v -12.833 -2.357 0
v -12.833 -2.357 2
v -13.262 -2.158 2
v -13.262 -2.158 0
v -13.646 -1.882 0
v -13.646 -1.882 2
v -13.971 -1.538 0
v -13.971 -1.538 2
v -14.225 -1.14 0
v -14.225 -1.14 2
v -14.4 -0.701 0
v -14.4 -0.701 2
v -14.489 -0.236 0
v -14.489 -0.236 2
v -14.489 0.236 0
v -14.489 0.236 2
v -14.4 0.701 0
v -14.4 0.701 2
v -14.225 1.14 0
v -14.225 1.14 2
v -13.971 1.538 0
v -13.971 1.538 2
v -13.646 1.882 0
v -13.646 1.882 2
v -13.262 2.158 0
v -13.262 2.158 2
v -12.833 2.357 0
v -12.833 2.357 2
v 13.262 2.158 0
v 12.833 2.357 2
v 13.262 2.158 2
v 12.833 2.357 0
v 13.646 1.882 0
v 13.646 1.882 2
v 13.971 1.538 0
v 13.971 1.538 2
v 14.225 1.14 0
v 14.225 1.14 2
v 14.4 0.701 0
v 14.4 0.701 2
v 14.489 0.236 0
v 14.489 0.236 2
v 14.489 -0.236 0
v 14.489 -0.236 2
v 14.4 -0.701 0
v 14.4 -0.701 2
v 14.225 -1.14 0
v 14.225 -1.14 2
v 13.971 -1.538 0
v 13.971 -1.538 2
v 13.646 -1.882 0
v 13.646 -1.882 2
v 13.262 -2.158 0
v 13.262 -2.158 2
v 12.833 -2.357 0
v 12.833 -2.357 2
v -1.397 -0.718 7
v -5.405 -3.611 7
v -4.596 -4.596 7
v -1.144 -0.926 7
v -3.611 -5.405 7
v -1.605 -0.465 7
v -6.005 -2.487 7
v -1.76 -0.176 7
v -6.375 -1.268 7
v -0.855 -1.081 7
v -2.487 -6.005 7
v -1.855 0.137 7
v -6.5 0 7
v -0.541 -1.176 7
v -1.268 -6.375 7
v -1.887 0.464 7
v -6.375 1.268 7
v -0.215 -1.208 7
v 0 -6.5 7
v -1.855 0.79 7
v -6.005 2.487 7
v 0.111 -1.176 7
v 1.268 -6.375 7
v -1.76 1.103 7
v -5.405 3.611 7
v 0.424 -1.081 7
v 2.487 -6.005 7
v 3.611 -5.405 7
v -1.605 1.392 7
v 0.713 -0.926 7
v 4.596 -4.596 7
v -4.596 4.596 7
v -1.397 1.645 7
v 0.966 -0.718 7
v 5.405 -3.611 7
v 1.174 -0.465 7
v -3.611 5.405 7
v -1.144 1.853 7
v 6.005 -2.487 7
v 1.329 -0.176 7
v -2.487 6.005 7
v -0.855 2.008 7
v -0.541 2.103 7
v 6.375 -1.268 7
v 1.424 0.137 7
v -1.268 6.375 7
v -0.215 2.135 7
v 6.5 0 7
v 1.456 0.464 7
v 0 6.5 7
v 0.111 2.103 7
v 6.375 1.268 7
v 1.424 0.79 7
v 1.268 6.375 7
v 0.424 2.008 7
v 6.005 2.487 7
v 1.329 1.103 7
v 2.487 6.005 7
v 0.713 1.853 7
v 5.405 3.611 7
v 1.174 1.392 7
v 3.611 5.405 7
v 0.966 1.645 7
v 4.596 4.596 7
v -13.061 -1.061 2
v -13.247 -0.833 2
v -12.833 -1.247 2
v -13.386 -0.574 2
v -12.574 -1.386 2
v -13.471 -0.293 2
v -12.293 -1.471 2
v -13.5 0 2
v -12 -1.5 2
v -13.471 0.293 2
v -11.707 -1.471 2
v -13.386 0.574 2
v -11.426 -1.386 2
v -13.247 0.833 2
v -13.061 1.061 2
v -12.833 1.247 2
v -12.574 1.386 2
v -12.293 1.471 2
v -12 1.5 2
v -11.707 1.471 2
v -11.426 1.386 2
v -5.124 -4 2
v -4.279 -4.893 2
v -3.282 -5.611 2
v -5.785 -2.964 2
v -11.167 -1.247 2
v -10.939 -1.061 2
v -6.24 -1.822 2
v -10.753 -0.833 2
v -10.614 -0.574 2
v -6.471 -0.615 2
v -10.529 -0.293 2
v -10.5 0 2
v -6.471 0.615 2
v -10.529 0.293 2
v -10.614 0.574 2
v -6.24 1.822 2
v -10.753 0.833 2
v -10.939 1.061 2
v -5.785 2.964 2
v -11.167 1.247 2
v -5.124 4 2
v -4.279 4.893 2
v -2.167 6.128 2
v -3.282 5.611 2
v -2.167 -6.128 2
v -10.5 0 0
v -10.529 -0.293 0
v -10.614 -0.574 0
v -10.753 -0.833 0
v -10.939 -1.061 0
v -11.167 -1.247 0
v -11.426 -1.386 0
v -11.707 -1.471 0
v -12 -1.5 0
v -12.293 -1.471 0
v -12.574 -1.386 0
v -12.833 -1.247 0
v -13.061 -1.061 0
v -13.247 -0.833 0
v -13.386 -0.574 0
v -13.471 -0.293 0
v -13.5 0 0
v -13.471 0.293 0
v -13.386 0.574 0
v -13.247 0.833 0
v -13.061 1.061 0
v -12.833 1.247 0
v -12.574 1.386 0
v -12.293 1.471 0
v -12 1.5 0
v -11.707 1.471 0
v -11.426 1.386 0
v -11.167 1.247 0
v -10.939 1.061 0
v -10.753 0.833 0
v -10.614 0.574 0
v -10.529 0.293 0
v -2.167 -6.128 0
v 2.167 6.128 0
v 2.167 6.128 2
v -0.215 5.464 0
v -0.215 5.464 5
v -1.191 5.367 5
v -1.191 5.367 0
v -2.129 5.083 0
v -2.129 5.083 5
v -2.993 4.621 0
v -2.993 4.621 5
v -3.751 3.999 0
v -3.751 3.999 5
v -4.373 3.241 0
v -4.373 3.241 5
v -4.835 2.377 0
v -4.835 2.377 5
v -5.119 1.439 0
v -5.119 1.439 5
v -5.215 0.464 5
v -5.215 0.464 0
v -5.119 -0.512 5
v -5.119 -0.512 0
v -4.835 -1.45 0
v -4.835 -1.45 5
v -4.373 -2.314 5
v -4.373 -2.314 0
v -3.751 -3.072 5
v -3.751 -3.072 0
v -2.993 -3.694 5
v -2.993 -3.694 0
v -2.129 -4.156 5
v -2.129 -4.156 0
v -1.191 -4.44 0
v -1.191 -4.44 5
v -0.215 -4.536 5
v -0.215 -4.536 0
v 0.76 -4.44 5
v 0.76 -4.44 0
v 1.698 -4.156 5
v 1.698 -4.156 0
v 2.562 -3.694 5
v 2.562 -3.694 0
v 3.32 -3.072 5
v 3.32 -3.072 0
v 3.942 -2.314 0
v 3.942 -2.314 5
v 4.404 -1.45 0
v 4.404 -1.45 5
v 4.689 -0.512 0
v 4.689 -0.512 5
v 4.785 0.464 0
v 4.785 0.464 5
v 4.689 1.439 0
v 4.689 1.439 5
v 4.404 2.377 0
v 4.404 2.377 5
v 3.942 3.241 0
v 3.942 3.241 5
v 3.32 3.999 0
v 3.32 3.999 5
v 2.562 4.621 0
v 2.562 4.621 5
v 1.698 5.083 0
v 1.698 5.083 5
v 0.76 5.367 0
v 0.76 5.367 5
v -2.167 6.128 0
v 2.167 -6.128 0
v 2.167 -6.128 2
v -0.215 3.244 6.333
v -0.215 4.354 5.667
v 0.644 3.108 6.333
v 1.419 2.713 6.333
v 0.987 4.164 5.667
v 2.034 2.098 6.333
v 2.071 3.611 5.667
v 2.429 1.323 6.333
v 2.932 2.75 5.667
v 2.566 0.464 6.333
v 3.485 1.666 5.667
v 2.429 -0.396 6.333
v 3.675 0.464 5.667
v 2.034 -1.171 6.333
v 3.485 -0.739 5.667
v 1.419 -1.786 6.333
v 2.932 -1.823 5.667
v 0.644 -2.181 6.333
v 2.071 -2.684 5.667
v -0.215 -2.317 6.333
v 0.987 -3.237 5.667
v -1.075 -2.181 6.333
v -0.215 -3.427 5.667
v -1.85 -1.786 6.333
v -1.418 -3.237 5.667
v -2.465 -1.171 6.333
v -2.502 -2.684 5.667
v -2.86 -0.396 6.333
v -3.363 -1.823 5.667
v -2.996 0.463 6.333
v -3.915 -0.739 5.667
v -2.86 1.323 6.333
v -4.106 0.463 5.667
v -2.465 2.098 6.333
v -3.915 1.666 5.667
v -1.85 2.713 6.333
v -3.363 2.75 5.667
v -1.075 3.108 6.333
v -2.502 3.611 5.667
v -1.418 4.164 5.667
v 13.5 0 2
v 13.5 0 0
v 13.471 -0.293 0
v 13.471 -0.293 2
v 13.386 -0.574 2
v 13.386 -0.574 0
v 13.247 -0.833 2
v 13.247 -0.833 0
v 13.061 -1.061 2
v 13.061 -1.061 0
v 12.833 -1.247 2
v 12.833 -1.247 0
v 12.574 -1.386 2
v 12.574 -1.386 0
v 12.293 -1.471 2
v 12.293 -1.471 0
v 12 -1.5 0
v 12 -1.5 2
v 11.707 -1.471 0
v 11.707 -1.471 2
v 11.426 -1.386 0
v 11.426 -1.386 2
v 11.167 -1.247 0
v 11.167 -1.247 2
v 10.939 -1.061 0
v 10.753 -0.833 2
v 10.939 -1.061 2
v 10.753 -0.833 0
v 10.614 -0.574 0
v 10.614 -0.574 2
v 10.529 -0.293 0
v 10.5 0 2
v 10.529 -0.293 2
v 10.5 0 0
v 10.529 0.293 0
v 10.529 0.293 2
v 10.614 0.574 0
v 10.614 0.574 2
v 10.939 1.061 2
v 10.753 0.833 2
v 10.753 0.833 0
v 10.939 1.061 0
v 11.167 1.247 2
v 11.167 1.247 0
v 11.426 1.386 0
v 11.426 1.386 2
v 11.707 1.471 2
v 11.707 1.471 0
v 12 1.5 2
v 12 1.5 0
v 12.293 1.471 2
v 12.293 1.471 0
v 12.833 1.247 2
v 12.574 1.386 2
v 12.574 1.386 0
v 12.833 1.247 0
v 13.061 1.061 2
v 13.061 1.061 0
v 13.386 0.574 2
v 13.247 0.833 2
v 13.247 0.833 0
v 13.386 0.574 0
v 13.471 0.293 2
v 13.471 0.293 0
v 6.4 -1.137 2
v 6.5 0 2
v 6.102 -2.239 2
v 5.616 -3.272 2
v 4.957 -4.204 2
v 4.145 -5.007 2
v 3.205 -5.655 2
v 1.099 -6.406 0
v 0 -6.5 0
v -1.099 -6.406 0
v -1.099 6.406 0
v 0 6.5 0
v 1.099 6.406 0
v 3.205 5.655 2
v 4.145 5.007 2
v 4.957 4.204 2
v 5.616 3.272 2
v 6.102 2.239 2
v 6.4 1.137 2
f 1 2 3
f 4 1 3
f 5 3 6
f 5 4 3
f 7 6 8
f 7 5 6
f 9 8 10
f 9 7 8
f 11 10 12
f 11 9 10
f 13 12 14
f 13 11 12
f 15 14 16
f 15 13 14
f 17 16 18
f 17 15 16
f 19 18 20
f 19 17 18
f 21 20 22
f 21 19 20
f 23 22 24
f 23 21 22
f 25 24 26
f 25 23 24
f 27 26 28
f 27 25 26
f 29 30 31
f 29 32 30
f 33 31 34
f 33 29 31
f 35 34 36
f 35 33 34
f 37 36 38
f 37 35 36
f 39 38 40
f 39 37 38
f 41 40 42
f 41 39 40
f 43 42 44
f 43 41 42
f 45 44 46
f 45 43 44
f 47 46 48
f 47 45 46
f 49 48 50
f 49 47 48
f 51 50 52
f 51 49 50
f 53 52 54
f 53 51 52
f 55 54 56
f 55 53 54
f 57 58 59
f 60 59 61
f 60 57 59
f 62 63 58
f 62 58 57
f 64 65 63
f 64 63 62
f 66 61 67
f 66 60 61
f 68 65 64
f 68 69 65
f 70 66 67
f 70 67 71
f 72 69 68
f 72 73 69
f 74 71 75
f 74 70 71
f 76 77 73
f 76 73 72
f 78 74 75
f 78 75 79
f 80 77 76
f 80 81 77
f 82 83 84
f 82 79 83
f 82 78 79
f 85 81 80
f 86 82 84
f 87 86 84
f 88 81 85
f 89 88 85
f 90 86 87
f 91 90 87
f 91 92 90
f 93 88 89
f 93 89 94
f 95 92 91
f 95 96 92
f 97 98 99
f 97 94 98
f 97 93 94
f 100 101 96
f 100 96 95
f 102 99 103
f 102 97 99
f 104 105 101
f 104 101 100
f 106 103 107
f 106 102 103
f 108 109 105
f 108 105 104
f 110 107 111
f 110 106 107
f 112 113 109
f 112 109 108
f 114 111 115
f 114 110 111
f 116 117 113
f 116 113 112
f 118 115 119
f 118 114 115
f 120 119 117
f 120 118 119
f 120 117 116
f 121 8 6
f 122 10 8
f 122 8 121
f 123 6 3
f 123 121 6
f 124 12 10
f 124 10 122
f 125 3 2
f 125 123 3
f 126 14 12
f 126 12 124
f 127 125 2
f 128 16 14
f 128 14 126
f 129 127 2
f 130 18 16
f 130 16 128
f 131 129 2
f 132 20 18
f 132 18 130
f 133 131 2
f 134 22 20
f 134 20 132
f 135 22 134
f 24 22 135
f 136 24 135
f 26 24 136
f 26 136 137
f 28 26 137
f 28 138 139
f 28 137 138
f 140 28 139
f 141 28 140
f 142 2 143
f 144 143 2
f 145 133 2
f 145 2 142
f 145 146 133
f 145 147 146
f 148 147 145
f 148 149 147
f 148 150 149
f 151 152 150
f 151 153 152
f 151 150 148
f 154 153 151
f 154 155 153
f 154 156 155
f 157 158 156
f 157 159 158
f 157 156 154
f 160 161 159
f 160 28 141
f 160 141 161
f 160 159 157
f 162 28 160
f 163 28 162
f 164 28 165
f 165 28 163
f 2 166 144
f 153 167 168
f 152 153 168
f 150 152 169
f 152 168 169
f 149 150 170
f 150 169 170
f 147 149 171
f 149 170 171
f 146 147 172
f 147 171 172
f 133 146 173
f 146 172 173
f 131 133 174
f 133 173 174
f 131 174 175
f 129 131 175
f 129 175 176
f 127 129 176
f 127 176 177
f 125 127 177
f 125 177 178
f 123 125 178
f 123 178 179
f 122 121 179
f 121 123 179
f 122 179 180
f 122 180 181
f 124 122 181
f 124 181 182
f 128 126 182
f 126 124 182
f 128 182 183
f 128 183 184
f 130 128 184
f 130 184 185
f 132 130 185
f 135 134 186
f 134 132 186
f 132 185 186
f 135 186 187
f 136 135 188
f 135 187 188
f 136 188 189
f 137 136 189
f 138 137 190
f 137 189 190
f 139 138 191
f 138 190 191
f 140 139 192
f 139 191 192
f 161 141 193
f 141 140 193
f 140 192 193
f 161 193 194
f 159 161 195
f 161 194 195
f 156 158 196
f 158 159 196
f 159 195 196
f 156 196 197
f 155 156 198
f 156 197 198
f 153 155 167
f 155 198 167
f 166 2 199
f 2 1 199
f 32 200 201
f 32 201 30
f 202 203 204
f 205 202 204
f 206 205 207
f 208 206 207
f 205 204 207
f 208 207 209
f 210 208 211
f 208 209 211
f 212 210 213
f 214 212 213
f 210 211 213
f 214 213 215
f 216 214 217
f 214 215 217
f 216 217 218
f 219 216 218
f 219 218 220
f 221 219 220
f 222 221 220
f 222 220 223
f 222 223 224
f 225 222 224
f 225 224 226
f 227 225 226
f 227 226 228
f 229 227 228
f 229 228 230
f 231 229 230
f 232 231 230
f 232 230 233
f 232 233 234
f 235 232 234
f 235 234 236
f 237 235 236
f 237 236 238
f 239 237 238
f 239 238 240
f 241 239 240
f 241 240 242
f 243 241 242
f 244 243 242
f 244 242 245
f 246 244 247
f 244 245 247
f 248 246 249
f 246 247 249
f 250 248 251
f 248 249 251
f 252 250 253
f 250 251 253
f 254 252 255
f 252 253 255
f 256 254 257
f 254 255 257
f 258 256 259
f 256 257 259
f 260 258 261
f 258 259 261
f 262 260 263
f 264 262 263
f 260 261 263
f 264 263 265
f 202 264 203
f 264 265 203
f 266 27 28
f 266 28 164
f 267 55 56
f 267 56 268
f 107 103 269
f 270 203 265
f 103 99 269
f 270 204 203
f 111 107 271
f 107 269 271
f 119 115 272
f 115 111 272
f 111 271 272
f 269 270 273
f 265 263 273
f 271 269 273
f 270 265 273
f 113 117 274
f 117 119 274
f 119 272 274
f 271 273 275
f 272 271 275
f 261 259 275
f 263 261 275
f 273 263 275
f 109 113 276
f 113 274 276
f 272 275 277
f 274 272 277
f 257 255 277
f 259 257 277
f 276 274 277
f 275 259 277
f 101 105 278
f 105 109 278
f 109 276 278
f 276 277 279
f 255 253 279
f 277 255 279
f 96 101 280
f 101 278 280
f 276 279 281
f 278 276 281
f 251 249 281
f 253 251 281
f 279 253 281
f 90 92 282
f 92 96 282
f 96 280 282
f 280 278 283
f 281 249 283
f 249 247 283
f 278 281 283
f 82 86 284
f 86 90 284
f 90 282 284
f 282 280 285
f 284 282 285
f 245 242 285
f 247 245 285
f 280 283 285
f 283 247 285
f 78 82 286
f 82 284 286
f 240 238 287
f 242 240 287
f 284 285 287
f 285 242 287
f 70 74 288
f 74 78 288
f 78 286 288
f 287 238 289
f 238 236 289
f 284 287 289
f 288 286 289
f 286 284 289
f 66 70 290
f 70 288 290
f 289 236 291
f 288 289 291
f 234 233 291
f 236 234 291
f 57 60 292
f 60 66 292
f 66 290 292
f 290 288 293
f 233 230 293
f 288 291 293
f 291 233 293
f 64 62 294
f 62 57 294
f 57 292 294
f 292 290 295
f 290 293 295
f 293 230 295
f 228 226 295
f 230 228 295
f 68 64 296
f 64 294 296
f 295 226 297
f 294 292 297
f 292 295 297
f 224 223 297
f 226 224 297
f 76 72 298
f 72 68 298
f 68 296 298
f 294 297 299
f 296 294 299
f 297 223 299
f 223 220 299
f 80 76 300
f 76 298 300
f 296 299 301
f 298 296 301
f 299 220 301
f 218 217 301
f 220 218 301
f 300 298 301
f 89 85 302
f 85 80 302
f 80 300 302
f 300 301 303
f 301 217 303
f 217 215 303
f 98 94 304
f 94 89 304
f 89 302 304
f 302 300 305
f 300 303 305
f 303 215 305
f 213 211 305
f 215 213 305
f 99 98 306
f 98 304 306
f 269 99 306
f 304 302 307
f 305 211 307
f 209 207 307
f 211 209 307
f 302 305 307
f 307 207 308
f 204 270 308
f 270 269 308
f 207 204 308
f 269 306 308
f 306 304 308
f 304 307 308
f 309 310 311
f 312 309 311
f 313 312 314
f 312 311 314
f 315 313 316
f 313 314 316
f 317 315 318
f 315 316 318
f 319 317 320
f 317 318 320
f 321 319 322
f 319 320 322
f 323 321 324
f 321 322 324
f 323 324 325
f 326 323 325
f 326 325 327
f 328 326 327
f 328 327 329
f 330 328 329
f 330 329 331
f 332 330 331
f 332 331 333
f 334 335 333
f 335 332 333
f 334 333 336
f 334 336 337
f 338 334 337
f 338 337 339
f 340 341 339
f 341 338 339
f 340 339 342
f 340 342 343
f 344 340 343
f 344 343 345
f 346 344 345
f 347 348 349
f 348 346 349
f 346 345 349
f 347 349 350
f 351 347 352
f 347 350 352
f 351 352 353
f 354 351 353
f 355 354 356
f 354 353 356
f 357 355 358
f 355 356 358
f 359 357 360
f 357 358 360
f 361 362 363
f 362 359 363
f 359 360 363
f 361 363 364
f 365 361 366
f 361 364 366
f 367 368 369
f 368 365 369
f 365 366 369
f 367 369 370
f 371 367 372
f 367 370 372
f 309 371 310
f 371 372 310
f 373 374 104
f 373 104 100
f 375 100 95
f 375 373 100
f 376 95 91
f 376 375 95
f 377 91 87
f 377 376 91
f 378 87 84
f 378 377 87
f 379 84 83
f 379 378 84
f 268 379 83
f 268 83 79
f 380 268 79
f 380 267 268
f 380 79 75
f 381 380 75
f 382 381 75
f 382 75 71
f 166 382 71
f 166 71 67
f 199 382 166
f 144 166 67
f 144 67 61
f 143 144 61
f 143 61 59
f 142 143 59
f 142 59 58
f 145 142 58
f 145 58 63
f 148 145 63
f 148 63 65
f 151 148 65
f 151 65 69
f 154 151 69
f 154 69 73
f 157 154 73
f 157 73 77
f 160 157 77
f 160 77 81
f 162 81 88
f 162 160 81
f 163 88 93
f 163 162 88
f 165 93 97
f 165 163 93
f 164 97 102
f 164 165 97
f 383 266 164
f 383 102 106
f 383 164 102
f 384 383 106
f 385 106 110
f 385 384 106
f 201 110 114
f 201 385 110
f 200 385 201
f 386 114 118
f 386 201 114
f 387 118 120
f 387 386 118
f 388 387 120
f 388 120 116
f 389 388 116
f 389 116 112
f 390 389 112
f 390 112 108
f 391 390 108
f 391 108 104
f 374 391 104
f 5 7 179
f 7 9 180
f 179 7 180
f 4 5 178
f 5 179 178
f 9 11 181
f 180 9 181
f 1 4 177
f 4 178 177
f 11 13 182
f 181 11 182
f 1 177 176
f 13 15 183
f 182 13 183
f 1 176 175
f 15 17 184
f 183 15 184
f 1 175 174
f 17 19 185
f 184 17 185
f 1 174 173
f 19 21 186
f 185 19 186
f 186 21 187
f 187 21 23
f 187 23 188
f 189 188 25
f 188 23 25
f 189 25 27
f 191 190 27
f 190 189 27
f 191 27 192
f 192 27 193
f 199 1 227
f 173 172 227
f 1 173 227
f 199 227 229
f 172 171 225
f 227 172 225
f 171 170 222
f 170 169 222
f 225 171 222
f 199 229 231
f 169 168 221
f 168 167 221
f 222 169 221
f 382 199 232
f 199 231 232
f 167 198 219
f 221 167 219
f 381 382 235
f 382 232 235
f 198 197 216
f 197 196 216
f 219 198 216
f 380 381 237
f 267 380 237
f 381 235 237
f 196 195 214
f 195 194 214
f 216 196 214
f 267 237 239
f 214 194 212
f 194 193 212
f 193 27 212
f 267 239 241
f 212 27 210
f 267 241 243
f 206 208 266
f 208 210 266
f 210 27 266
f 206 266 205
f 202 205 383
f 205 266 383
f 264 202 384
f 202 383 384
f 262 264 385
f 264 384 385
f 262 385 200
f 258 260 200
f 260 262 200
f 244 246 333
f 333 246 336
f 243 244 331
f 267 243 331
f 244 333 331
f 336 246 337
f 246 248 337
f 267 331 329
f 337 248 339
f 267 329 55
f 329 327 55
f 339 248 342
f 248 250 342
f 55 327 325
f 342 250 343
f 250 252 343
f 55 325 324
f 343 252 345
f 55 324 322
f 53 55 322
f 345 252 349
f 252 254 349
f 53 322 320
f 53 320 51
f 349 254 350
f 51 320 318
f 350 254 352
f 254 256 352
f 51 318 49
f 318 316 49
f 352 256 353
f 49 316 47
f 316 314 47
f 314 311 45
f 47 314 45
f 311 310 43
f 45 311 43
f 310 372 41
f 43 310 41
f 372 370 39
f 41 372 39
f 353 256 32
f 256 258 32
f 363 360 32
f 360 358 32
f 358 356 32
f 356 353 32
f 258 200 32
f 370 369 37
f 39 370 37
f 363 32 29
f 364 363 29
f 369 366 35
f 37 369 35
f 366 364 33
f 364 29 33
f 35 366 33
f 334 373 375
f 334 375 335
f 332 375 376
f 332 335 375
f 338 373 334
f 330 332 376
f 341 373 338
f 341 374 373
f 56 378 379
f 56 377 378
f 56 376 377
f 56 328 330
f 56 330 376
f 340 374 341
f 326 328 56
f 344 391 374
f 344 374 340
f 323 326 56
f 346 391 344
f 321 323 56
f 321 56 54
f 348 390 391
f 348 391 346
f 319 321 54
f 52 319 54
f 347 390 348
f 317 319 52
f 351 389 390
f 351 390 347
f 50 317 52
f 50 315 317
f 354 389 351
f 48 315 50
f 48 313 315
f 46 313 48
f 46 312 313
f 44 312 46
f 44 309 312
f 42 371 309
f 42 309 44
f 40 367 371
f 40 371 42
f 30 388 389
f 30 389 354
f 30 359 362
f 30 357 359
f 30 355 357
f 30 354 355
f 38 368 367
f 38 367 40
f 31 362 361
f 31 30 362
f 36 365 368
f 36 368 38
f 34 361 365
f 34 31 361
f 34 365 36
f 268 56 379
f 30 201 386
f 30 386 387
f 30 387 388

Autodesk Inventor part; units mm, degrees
ref_plane "YZ Plane" through (0, 0, 0) normal (1, 0, 0) x (0, 1, 0)
ref_plane "XZ Plane" through (0, 0, 0) normal (0, 1, 0) x (-1, 0, 0)
ref_plane "XY Plane" through (0, 0, 0) normal (0, 0, 1) x (1, 0, 0)
sketch "Sketch3" plane through (0, 0, 0) normal (0, 0, 1) x (1, 0, 0)
  circle A0 centre (0, 0) radius 5
  circle A1 centre (0, 0) radius 6.5
  line L0 (-12.3755, 0) -> (14, 0) construction
  circle A2 centre (12, 0) radius 2.5
  circle A3 centre (-12, 0) radius 2.5
  line L1 (-12.8333, 2.357) -> (-2.1667, 6.1283)
  line L2 (-12.8333, -2.357) -> (-2.1667, -6.1283)
  line L3 (2.1667, 6.1283) -> (12.8333, 2.357)
  line L4 (12.8333, -2.357) -> (2.1667, -6.1283)
  circle A4 centre (-12, 0) radius 1.5
  circle A5 centre (12, 0) radius 1.5
  dimension "d6" = 10
  dimension "d7" = 13
  dimension "d21" = 5
  dimension "d22" = 5
  dimension "d23" = 12
  dimension "d24" = 12
  dimension "d25" = 3
  dimension "d26" = 3
extrude "Extrusion2" add sketch "Sketch3" along normal blind 7 contours A0 | A1
extrude "Extrusion5" add sketch "Sketch3" along normal blind 2 contours A0 | A1 | A1 L3 A2 L4 | A1 L2 A3 L1 | A2 | A3
sketch "Sketch5" plane through (0, 0, 0) normal (0, 0, -1) x (-1, 0, 0)
  point P0 (0, 0)
  point P1 (0.2154, 0.4635)
hole "Hole2" at (-0.2154, 0.4635, 0) direction (0, 0, 1) diameter 10 depth 5 tip angle 118
properties part number "bearingHousing"
